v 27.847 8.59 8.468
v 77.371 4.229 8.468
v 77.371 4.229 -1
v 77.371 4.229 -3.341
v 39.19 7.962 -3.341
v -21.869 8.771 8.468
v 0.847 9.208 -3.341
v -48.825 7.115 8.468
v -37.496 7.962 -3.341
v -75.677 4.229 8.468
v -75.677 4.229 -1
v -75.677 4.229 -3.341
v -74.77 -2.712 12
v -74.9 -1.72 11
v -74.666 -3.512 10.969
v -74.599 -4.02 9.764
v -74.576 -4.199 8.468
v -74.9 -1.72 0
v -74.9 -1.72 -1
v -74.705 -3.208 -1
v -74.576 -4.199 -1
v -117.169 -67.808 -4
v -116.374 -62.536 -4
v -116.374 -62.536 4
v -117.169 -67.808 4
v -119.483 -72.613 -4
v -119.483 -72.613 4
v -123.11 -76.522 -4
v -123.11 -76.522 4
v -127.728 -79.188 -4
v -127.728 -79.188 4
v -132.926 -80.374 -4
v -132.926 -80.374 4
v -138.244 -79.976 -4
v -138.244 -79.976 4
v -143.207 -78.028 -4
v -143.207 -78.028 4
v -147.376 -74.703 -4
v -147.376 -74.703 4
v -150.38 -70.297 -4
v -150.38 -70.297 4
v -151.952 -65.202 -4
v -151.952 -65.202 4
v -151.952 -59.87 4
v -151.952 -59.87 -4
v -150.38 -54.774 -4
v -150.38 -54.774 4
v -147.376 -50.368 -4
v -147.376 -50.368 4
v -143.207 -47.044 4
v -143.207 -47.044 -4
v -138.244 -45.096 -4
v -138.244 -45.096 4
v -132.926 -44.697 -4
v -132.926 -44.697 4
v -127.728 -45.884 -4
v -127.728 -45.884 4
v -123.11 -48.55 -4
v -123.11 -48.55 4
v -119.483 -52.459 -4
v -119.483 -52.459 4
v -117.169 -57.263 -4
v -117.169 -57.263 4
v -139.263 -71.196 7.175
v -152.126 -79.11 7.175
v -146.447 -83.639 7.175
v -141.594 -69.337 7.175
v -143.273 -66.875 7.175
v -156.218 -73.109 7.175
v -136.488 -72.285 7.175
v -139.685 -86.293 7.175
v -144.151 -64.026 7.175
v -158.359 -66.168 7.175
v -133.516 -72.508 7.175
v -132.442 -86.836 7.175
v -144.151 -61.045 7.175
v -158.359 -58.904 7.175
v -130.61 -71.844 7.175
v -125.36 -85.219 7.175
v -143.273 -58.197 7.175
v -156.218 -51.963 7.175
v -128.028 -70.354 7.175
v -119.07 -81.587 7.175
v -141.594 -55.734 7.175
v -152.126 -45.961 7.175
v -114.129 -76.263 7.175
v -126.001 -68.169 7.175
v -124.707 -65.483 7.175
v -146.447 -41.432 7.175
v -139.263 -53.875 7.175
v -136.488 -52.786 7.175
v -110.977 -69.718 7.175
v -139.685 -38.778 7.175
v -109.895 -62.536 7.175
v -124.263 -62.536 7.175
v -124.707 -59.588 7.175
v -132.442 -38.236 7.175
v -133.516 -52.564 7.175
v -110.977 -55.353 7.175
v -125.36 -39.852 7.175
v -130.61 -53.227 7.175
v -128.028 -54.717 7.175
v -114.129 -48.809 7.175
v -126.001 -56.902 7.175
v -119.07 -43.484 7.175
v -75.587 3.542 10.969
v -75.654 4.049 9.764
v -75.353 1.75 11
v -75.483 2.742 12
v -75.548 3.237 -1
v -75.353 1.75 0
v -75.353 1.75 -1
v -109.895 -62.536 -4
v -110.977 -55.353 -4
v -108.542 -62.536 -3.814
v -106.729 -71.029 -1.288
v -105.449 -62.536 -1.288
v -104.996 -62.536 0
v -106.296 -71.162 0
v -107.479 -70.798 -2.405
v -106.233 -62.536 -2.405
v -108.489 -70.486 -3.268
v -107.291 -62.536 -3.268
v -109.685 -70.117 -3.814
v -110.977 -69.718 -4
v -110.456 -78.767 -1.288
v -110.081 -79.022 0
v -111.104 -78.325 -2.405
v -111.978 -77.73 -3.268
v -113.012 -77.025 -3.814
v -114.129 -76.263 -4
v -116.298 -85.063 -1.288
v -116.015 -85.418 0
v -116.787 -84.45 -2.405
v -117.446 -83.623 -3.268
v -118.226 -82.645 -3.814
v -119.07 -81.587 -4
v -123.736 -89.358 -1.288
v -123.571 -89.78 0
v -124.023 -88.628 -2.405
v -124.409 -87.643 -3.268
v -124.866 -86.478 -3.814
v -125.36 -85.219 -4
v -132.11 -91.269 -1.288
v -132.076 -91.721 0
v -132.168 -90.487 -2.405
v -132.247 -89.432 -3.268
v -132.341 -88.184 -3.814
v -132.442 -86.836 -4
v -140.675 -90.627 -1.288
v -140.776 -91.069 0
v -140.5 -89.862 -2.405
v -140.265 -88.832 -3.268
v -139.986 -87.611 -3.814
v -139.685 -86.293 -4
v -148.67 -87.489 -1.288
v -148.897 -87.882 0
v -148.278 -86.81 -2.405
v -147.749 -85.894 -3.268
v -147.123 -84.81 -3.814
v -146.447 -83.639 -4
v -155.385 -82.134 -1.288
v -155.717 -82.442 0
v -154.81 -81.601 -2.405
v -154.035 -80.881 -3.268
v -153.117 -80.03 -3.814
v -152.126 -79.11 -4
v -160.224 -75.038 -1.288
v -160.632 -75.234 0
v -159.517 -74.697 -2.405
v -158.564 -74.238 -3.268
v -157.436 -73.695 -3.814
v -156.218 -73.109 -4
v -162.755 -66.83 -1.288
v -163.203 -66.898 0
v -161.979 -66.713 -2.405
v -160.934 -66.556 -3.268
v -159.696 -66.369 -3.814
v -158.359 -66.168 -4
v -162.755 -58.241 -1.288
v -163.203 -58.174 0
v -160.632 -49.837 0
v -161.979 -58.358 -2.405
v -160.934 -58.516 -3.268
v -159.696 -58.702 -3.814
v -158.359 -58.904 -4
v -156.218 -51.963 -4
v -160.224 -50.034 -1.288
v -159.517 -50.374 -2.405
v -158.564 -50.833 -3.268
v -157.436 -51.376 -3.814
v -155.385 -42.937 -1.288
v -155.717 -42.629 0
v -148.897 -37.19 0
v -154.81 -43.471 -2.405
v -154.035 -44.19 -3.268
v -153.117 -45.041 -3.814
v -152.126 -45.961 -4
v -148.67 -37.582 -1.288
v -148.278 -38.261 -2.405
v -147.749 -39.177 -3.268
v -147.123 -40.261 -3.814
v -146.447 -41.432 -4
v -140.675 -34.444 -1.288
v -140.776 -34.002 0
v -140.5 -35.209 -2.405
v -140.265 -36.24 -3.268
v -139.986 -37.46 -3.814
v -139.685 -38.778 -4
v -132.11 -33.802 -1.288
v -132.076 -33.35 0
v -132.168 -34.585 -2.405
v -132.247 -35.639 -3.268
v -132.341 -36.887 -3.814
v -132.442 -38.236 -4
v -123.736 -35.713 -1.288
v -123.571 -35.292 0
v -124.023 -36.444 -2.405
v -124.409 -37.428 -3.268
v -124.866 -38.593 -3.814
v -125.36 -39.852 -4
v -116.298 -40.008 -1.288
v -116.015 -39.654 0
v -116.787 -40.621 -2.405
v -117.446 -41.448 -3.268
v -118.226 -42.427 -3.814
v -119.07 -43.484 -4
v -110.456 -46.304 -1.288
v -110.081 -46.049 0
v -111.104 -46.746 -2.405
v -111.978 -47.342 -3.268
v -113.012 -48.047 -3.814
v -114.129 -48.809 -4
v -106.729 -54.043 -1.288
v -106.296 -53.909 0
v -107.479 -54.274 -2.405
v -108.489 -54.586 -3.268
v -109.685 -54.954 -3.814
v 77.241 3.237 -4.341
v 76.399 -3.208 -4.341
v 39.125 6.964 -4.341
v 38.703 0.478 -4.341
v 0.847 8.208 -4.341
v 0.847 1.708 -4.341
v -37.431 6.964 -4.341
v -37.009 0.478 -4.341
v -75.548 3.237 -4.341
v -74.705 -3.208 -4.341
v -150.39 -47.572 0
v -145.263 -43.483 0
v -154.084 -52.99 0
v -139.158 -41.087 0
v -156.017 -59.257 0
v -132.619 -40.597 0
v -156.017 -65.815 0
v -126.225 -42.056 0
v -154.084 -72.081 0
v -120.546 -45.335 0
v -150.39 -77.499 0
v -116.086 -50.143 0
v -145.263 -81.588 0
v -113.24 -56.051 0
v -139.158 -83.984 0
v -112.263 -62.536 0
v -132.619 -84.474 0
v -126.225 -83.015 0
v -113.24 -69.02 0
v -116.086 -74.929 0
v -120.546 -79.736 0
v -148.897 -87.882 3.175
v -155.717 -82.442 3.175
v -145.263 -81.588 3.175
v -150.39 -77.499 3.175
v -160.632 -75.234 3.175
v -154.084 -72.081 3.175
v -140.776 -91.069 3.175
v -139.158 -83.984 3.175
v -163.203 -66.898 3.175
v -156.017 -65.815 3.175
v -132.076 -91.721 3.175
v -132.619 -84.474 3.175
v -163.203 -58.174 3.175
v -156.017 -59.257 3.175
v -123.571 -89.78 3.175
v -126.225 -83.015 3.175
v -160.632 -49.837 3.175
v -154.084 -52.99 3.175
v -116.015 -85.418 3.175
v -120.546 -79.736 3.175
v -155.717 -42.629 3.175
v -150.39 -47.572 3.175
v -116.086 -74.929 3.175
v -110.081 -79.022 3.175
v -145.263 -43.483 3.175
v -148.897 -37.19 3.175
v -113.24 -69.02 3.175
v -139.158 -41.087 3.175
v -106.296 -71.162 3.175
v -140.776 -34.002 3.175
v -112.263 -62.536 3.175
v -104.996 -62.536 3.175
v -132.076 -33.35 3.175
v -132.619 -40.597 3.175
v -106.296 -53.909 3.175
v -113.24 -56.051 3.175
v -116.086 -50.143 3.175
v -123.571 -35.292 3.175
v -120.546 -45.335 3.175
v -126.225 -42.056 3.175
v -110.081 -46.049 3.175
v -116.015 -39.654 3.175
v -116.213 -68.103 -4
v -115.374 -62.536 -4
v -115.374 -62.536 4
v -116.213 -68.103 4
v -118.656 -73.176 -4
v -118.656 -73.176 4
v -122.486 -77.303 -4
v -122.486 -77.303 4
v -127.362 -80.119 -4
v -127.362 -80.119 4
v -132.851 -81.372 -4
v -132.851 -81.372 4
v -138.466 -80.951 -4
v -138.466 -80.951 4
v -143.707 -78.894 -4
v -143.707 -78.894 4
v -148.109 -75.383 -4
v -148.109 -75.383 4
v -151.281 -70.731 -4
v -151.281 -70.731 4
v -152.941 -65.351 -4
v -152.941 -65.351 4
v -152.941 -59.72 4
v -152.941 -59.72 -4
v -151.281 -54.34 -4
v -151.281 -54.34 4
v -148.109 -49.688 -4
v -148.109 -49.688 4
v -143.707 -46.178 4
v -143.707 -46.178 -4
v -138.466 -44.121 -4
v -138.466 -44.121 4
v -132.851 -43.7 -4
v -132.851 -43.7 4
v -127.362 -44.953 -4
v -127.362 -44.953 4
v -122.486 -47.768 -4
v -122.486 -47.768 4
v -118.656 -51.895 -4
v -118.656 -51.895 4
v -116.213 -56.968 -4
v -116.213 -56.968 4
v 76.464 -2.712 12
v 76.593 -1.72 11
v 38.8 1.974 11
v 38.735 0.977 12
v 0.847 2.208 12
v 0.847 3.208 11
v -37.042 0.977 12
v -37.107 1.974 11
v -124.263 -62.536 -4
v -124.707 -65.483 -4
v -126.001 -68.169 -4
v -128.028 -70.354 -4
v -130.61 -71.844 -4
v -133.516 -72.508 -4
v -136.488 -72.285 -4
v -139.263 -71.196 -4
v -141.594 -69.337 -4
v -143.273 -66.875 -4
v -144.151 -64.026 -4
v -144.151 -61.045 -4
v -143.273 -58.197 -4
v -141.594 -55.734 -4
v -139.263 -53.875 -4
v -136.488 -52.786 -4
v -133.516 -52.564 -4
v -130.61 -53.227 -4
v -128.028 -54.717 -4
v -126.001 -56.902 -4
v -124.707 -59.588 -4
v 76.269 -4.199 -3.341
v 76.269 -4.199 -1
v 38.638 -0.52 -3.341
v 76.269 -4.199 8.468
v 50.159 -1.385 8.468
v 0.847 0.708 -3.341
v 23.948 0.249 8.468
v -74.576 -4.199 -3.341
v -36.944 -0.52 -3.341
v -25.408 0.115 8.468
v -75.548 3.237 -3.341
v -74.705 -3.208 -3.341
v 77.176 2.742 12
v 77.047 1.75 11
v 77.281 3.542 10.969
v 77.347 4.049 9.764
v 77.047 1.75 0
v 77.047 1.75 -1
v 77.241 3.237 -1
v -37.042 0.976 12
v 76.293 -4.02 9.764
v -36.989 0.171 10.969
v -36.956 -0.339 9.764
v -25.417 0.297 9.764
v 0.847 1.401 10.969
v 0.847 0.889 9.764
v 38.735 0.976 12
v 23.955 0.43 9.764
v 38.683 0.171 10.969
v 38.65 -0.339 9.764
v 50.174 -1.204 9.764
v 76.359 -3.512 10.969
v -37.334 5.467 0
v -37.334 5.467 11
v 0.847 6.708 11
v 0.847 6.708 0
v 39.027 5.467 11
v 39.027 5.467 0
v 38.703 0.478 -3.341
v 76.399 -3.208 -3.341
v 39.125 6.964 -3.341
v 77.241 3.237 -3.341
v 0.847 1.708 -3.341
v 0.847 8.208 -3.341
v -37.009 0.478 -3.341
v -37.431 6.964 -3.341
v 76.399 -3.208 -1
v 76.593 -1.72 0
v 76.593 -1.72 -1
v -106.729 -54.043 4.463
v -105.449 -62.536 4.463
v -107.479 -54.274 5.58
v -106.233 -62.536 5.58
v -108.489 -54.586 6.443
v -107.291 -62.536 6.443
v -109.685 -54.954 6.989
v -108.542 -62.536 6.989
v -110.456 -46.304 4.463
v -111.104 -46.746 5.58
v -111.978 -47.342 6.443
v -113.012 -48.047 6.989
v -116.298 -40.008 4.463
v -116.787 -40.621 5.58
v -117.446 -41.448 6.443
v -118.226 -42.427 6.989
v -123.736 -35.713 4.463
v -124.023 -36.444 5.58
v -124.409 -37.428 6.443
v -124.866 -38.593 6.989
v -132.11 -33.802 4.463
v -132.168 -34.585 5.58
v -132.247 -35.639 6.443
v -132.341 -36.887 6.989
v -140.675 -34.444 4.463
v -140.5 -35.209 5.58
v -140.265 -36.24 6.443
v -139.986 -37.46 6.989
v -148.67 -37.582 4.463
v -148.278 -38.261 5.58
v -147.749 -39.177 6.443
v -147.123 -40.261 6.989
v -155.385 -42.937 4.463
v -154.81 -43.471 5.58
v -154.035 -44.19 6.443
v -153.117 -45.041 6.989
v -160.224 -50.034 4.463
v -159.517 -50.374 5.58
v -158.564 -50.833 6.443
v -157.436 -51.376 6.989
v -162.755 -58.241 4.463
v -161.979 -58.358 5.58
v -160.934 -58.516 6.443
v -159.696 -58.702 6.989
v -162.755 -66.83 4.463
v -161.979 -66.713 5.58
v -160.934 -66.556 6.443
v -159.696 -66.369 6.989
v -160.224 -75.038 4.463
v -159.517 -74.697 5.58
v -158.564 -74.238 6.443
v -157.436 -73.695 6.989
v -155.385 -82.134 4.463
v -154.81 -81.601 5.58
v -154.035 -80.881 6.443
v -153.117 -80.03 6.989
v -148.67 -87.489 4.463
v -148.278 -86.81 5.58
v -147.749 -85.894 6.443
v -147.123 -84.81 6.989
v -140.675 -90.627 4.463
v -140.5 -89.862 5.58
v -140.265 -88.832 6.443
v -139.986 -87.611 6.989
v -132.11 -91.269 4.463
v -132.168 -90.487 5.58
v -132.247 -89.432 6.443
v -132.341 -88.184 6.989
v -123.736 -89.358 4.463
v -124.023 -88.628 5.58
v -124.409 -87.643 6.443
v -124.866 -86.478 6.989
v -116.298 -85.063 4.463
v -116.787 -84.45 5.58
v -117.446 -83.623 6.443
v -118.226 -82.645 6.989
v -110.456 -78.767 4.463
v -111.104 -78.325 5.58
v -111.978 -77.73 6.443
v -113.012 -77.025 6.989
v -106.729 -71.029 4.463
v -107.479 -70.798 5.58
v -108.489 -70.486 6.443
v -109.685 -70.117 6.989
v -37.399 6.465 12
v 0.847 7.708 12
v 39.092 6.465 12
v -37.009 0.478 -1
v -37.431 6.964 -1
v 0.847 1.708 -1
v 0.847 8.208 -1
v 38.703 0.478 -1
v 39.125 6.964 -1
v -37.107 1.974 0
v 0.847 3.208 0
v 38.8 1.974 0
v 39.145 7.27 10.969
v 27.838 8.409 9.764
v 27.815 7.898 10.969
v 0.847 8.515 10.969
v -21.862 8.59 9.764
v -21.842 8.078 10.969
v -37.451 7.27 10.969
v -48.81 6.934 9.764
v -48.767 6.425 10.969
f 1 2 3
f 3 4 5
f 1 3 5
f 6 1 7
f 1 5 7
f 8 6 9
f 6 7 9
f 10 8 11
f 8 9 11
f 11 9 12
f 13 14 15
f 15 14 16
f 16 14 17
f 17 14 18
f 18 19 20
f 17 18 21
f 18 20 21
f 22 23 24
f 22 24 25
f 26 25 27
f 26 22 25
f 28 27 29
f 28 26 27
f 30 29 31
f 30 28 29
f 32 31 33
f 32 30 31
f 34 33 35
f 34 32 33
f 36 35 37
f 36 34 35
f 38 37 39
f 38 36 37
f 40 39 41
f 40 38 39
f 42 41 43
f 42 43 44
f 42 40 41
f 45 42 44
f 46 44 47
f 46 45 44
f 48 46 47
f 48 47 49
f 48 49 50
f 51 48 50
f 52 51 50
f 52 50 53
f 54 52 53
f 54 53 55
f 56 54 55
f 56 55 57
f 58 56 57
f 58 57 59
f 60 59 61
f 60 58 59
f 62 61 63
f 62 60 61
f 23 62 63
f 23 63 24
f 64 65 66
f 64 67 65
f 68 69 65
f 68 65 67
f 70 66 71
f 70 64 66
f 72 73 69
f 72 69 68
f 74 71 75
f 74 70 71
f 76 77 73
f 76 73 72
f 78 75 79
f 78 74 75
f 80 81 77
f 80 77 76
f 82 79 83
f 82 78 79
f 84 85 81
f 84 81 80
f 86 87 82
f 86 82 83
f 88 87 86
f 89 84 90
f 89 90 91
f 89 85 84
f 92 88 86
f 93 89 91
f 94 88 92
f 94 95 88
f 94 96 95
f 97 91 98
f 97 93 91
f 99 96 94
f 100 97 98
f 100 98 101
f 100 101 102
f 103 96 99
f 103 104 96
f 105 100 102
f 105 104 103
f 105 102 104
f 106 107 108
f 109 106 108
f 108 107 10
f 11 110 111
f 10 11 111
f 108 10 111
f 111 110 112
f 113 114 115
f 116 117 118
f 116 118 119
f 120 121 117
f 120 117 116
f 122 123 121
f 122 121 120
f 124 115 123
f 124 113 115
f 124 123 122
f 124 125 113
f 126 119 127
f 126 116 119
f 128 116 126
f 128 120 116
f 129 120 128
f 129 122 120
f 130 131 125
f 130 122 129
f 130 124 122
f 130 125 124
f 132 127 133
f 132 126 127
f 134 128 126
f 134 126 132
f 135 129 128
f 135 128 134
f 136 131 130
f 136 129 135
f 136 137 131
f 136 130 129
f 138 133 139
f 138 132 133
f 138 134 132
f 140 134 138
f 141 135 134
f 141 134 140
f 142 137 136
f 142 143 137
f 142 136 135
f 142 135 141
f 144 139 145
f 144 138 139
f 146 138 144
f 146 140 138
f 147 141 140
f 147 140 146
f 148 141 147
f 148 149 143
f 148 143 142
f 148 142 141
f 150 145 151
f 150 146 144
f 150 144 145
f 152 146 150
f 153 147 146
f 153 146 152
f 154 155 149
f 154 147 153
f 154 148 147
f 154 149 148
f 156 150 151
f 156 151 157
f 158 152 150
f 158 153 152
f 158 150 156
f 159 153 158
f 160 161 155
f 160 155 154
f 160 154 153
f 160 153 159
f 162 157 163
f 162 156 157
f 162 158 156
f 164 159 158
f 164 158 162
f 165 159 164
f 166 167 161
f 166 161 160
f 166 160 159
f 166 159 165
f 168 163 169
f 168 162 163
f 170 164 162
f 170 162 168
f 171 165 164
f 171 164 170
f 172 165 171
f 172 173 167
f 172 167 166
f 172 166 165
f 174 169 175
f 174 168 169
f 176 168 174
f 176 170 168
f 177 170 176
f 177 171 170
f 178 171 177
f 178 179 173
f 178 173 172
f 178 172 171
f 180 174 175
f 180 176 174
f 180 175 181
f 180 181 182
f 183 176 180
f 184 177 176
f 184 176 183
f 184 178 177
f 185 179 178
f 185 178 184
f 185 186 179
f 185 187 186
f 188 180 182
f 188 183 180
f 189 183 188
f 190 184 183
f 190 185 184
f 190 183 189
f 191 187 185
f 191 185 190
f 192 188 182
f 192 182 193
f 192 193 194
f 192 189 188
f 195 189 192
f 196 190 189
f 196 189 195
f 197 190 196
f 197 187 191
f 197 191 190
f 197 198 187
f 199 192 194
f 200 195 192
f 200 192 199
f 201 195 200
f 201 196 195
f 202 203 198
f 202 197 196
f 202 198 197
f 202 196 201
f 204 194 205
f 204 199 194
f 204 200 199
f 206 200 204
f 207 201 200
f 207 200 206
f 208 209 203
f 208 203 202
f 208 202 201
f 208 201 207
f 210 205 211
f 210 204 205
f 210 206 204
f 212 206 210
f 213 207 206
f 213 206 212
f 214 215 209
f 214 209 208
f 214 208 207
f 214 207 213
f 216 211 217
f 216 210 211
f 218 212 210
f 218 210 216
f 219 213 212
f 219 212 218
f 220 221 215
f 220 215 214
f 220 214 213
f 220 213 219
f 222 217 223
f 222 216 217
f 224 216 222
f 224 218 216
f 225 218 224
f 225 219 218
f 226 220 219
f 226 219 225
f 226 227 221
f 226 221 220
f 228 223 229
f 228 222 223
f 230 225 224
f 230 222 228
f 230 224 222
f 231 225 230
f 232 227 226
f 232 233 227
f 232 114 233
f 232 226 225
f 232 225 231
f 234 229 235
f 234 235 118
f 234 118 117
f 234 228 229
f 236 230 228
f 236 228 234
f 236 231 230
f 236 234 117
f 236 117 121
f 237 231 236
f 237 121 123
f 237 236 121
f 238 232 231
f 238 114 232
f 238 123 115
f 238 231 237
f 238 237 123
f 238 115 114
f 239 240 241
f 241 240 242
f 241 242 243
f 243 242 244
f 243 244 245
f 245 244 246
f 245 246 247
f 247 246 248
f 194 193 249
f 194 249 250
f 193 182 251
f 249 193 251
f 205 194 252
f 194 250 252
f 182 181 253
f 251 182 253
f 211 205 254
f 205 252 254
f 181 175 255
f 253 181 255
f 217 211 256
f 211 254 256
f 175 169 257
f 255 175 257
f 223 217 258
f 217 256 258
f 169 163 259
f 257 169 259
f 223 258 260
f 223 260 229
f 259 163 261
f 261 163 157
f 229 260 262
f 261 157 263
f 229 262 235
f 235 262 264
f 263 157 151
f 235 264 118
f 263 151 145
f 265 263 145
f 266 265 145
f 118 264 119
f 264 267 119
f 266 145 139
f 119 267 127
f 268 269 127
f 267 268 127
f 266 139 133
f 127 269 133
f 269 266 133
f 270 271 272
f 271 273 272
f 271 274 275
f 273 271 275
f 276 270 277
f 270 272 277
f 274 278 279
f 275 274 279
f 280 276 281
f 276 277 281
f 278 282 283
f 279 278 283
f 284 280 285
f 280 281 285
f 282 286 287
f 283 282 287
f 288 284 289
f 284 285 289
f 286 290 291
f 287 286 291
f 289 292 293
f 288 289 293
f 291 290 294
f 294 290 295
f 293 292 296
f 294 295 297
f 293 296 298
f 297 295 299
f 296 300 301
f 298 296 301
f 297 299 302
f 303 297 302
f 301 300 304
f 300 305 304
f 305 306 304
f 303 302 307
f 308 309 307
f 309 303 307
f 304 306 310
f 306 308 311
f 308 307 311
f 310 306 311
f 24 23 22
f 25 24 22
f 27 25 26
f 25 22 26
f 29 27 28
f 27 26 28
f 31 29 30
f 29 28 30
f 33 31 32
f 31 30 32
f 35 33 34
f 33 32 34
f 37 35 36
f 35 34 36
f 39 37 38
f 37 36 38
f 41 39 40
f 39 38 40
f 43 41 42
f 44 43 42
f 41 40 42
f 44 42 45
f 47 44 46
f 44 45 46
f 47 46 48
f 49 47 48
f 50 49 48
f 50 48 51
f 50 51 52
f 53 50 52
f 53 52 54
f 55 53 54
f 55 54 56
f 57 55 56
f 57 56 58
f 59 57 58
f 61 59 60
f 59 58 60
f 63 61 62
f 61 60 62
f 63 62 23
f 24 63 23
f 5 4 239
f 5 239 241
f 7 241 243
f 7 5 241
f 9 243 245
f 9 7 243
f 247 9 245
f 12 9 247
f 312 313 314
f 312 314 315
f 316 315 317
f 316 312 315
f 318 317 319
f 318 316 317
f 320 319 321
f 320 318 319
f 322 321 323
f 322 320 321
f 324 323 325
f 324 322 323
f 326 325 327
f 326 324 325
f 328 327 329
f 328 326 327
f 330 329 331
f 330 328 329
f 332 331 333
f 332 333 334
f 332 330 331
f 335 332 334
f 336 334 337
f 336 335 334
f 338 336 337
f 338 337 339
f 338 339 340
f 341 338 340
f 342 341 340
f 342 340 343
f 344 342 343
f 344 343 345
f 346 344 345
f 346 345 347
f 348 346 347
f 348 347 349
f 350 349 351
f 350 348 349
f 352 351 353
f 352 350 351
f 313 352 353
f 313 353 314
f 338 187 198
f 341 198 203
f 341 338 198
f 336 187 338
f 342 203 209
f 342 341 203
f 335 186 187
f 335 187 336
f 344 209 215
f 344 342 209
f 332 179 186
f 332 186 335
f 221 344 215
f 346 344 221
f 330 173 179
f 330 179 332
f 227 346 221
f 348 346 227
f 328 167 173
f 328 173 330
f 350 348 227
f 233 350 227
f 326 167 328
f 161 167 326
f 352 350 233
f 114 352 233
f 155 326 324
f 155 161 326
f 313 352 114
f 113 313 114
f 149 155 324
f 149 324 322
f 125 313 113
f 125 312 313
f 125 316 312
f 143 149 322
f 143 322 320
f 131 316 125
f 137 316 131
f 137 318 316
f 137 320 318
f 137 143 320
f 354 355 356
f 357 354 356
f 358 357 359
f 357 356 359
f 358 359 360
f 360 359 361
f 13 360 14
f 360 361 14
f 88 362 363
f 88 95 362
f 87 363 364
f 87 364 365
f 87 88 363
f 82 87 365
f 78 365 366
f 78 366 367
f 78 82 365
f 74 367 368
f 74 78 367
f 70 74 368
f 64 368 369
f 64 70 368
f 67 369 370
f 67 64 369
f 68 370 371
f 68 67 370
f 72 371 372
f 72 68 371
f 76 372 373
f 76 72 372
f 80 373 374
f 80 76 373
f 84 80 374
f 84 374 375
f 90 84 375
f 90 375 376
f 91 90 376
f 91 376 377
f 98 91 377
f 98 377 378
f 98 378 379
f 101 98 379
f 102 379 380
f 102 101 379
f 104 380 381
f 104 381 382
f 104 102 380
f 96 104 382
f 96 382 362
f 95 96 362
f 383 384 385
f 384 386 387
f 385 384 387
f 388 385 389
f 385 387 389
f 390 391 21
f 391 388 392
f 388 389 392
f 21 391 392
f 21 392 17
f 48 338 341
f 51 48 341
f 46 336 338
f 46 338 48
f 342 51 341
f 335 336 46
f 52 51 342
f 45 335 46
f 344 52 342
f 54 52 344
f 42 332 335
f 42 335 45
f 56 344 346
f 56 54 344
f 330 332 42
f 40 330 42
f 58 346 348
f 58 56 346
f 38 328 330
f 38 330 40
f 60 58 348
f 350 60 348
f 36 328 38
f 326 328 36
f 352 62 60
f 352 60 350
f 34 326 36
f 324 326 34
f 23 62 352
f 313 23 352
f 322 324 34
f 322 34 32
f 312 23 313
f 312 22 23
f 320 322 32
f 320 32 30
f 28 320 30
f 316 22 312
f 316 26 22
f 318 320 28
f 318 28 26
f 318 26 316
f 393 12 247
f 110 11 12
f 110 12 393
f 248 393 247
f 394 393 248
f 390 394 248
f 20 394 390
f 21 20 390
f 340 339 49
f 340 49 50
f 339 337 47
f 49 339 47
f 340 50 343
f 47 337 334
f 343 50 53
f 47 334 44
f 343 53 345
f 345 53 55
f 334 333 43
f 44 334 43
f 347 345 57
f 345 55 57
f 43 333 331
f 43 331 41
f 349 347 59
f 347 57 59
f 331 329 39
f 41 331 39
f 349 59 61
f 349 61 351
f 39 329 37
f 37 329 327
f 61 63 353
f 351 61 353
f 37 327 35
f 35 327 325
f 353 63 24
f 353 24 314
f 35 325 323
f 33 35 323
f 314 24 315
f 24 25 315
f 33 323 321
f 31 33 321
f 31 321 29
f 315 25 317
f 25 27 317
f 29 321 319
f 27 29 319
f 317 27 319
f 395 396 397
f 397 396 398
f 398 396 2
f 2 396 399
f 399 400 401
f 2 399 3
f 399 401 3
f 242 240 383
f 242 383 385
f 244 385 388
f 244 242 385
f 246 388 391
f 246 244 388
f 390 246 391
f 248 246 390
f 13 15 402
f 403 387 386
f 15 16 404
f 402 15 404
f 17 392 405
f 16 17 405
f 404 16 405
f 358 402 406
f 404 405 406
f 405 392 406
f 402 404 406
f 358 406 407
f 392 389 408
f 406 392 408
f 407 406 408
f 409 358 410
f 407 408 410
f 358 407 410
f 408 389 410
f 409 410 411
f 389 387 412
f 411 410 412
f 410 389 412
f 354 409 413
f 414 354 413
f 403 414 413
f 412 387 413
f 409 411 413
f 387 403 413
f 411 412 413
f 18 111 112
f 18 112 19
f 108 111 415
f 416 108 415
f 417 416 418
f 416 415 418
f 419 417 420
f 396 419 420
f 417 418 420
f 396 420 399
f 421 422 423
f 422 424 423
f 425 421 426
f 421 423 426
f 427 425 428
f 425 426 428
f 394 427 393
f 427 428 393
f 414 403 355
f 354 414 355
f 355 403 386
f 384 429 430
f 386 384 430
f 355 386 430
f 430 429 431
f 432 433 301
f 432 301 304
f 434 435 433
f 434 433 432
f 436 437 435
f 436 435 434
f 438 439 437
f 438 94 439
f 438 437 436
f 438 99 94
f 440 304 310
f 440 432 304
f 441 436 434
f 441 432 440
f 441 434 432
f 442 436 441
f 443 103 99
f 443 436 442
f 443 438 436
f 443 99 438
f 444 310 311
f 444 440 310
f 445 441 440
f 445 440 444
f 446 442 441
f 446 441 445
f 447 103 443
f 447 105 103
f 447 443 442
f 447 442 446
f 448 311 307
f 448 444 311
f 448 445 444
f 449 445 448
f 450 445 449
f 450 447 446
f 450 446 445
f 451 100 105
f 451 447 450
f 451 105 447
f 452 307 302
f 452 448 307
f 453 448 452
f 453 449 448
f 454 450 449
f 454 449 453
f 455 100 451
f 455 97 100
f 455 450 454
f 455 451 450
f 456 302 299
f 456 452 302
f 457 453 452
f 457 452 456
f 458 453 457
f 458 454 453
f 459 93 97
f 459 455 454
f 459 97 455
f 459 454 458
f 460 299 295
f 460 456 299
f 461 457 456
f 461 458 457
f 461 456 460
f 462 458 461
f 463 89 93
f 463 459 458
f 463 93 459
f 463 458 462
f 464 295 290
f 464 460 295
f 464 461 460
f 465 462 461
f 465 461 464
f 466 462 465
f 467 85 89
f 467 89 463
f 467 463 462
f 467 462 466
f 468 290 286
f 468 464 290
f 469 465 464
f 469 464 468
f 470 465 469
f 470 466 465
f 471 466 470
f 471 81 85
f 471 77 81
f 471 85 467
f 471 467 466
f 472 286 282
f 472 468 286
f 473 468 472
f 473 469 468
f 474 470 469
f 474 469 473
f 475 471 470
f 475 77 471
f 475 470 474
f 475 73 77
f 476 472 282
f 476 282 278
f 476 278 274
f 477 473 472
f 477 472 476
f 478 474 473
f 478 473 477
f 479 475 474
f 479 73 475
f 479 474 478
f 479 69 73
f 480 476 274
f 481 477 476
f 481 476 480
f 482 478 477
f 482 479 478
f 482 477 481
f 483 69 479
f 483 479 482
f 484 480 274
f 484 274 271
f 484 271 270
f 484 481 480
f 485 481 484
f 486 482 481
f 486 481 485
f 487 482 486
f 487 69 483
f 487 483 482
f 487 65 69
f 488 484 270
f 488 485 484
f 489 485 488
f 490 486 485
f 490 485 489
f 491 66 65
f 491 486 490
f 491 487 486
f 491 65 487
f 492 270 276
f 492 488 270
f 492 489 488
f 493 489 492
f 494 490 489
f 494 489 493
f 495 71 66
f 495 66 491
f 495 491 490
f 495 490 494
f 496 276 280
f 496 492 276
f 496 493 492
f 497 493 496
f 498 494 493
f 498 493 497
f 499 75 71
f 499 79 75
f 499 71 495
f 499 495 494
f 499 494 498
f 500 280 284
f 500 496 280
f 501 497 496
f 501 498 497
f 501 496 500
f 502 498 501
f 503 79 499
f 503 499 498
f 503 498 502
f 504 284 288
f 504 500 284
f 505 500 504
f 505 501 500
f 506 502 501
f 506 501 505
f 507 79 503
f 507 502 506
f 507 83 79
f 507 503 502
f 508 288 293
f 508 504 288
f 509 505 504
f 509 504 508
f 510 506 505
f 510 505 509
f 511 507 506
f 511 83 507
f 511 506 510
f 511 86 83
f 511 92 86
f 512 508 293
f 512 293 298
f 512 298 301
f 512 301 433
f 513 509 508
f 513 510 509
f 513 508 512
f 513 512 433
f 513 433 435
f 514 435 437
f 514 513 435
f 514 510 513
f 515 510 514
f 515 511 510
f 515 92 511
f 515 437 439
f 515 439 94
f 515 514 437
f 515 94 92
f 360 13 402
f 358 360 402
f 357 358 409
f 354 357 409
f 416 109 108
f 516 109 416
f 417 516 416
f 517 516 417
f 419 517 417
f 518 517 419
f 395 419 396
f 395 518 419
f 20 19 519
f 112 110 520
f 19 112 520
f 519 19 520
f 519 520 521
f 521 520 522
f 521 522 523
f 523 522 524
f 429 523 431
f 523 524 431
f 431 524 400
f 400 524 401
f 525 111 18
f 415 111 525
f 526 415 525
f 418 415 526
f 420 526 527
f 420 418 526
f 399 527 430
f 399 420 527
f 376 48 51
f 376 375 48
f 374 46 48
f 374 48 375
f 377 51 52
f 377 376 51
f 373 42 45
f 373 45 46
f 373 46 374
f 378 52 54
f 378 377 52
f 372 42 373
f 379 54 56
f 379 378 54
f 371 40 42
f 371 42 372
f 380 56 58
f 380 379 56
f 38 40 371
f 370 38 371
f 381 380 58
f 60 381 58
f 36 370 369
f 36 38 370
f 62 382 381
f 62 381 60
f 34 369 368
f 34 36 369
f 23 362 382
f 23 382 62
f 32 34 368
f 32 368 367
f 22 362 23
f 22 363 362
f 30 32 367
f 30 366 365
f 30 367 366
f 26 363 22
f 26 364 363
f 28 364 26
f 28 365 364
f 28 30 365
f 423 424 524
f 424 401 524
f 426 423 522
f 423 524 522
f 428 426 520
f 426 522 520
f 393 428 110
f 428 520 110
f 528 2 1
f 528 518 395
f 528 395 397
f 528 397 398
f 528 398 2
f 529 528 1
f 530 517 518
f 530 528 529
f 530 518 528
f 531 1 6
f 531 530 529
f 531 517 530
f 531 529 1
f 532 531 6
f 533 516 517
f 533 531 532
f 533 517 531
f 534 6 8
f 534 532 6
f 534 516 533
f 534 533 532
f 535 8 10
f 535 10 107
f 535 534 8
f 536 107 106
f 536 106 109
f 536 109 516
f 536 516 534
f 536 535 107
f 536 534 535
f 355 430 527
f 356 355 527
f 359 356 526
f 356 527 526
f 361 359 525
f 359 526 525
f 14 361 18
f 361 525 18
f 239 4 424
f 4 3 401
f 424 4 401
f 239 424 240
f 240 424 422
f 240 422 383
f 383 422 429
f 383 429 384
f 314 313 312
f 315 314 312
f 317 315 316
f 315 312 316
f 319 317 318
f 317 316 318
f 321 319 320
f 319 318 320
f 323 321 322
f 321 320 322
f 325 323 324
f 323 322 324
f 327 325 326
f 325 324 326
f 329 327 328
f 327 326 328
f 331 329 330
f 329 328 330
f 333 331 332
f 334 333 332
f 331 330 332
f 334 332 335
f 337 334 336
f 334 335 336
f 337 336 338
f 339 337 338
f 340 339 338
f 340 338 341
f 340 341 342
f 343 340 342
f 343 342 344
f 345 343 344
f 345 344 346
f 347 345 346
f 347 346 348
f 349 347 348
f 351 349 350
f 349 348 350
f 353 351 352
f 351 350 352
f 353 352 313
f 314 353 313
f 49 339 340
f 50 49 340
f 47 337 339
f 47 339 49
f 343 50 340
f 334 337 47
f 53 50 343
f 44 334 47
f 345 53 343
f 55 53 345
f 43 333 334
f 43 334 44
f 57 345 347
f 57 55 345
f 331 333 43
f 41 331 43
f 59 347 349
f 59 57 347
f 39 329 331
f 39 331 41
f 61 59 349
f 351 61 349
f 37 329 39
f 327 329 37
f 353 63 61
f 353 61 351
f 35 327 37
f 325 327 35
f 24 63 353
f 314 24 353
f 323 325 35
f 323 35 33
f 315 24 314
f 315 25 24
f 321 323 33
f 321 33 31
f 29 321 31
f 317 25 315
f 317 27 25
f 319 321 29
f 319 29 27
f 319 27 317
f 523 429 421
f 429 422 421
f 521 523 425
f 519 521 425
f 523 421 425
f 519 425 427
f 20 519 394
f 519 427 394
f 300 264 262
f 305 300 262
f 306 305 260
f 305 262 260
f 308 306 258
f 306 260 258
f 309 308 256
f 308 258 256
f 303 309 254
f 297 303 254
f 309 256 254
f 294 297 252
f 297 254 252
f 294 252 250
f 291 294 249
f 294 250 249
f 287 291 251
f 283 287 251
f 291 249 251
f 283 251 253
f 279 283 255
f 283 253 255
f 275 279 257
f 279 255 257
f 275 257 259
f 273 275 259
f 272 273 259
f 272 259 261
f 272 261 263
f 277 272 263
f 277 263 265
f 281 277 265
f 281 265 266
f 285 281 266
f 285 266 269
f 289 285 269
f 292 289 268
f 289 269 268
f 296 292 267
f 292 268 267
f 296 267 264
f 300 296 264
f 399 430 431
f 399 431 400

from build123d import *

# Parameters (mm, degrees)
F1_DEPTH    = 1
F4_DEPTH    = 1
F6_DEPTH    = 12
F7_SIZE     = 1
F8_T2_ANGLE = 16.6478295889
F8_T4_ANGLE = 16.6225349948
F11_SIZE    = 1
F12_R       = 22
F12_R_2     = 10
F13_DEPTH   = 3.175
F14_R       = 29.2671438264
F15_DEPTH   = 4
F17_DEPTH   = 25
F18_R       = 29.2671438264
F18_R_2     = 10
F19_DEPTH   = 4
F21_R       = 18.8886705246
F21_R_2     = 17.8886705246
F22_DEPTH   = 8


# Not quite as in the source:
# - a fillet or chamfer that OpenCascade refuses, or shapes differently, is made with other operations: its cross-section is extruded or revolved along the edge and cut away or added


with BuildPart() as f1:
    # F0 (on Top) → F1 (new body)
    with BuildSketch(Plane.XY):
        Polygon((76.2, -1.75), (76.2, 1.75), (76.2, 6.1025535688), (-76.2, 6.1025535688), (-76.2, 1.75), (-76.2, -1.75), (-76.2, -6.1025535688), (76.2, -6.1025535688), align=None)
    extrude(amount=-F1_DEPTH)


with BuildPart() as f4:
    # F3 (on Top) → F4 (new body)
    with BuildSketch(Plane.XY):
        with BuildLine():
            Line((76.2692624922, -4.1994154081), (76.5932074415, -1.7204923214))
            ThreePointArc((76.5932074415, -1.7204923214), (0.8467303705, 3.2078201362), (-74.8997467005, -1.7204923214))
            Line((-74.8997467005, -1.7204923214), (-74.5758017512, -4.1994154081))
            ThreePointArc((-74.5758017512, -4.1994154081), (0.8467303705, 0.7078201362), (76.2692624922, -4.1994154081))
        make_face()
        with BuildLine():
            Line((76.5932074415, -1.7204923214), (77.0467303705, 1.75))
            ThreePointArc((77.0467303705, 1.75), (0.8467303705, 6.7078201362), (-75.3532696295, 1.75))
            Line((-75.3532696295, 1.75), (-74.8997467005, -1.7204923214))
            ThreePointArc((-74.8997467005, -1.7204923214), (0.8467303705, 3.2078201362), (76.5932074415, -1.7204923214))
        make_face()
        with BuildLine():
            ThreePointArc((-75.3532696295, 1.75), (0.8467303705, 6.7078201362), (77.0467303705, 1.75))
            Line((77.0467303705, 1.75), (77.3706753198, 4.2289230867))
            ThreePointArc((77.3706753198, 4.2289230867), (0.8467303705, 9.2078201362), (-75.6772145787, 4.2289230867))
            Line((-75.6772145787, 4.2289230867), (-75.3532696295, 1.75))
        make_face()
    extrude(amount=-F4_DEPTH)

    # F5 (on face) → F6 (join)
    with BuildSketch(Plane.XY):
        with BuildLine():
            ThreePointArc((-75.3532696295, 1.75), (0.8467303705, 6.7078201362), (77.0467303705, 1.75))
            Line((77.0467303705, 1.75), (77.3706753198, 4.2289230867))
            ThreePointArc((77.3706753198, 4.2289230867), (0.8467303705, 9.2078201362), (-75.6772145787, 4.2289230867))
            Line((-75.6772145787, 4.2289230867), (-75.3532696295, 1.75))
        make_face()
        with BuildLine():
            Line((76.2692624922, -4.1994154081), (76.5932074415, -1.7204923214))
            ThreePointArc((76.5932074415, -1.7204923214), (0.8467303705, 3.2078201362), (-74.8997467005, -1.7204923214))
            Line((-74.8997467005, -1.7204923214), (-74.5758017512, -4.1994154081))
            ThreePointArc((-74.5758017512, -4.1994154081), (0.8467303705, 0.7078201362), (76.2692624922, -4.1994154081))
        make_face()
    extrude(amount=F6_DEPTH)

    # F7
    f7_edges = [f4.edges().sort_by_distance(p)[0] for p in [
        (0.84673, 6.70782, 12),
        (0.84673, 3.20782, 12),
    ]]
    chamfer(f7_edges, length=F7_SIZE)

    # F8: fillet of radius 5 on 2 edges, made by hand

    # F8_s1 → F8_t2 (revolve, cut)
    with BuildSketch(Plane(origin=(-82.446715332, -12.0628221249, 0), x_dir=(0, 0, 1), z_dir=(-0.9894654498, -0.1447692085, 0))):
        with BuildLine():
            ThreePointArc((12.0001071227, 8.2094487393), (10.36586952, 7.099643712), (8.4293487989, 6.709403738))
            Line((8.4293487989, 6.709403738), (8.4293487989, 6.609403738))
            ThreePointArc((8.4293487989, 6.609403738), (10.2146743994, 6.609553738), (12, 6.609553738))
            Line((12, 6.609553738), (12.1, 6.709553738))
            ThreePointArc((12.1, 6.709553738), (12.1, 7.4595012386), (12.0715222892, 8.1394496393))
            Line((12.0715222892, 8.1394496393), (12.0001071227, 8.2094487393))
        make_face()
    revolve(axis=Axis((0.8467303705, -581.3550603549, 12), (0, 0, -1)), revolution_arc=F8_T2_ANGLE, mode=Mode.SUBTRACT)

    # F8_s3 → F8_t4 (revolve, cut)
    with BuildSketch(Plane(origin=(83.9817821189, -12.2684844413, 0), x_dir=(0, 0, 1), z_dir=(0.9894973816, -0.1445507933, 0))):
        with BuildLine():
            ThreePointArc((8.4293487989, -15.4361160503), (10.36586952, -15.0458760762), (12.0001071227, -13.9360710489))
            Line((12.0001071227, -13.9360710489), (12.0715222892, -14.0060701489))
            ThreePointArc((12.0715222892, -14.0060701489), (12.1, -14.6860185496), (12.1, -15.4359660503))
            Line((12.1, -15.4359660503), (12, -15.5359660503))
            ThreePointArc((12, -15.5359660503), (10.2146743994, -15.5359660503), (8.4293487989, -15.5361160503))
            Line((8.4293487989, -15.5361160503), (8.4293487989, -15.4361160503))
        make_face()
    revolve(axis=Axis((0.8467303705, -581.3550603549, 12), (0, 0, 1)), revolution_arc=F8_T4_ANGLE, mode=Mode.SUBTRACT)

    # F10: sweep along a path in F10_path
    with BuildLine(Plane(origin=(76.2692624922, -4.1994154081, -1), x_dir=(0, -1, 0), z_dir=(0, 0, -1))) as f10_path:
        ThreePointArc((0, 0), (-4.9072355443, 75.4225321217), (0, 150.8450642434))
    # F9 (on face) → F10 (sweep)
    with BuildSketch(Plane(origin=(-73.8632044186, -9.6524221094, 0), x_dir=(0.1295779797, -0.9915692347, 0), z_dir=(-0.9915692347, -0.1295779797, 0))):
        Polygon((-5.4993706043, -4.3409038335), (-5.4993706043, -1), (-6.4993706043, -1), (-6.4993706043, -3.3409038335), (-12.9993706043, -3.3409038335), (-12.9993706043, -1), (-13.9993706043, -1), (-13.9993706043, -4.3409038335), align=None)
    sweep(path=f10_path.line)

    # F11
    f11_edges = [f4.edges().sort_by_distance(p)[0] for p in [
        (0.84673, 0.70782, -4.340904),
        (0.84673, 9.20782, -4.340904),
    ]]
    chamfer(f11_edges, length=F11_SIZE)


with BuildPart() as f13:
    # F12 (on Top) → F13 (new body)
    with BuildSketch(Plane.XY):
        with Locations((-134.2629939318, -62.5356882811)):
            Circle(F12_R)
        with Locations((-134.2629939318, -62.5356882811)):
            Circle(F12_R_2, mode=Mode.SUBTRACT)
    extrude(amount=F13_DEPTH)

    # F14 (on face) → F15 (join)
    with BuildSketch(Plane.XY.offset(3.175)):
        with Locations((-134.2629939318, -62.5356882811)):
            Circle(F14_R)
    extrude(amount=F15_DEPTH)

    # F16: fillet of radius 5 on 1 edges, made by hand

    # F16_s1 → F16_t2 (revolve, cut)
    with BuildSketch(Plane.XZ.offset(62.5356882811)):
        with BuildLine():
            ThreePointArc((-104.9958501054, 3.175), (-106.7325519308, 6.0479833462), (-109.894829591, 7.175))
            Line((-109.894829591, 7.175), (-104.9958501054, 7.175))
            Line((-104.9958501054, 7.175), (-104.9958501054, 3.175))
        make_face()
    revolve(axis=Axis((-134.2629939318, -62.5356882811, 7.175), (0, 0, 1)), mode=Mode.SUBTRACT)

    # F17 (cut): a face of the model
    f17_faces = [f13.faces().sort_by_distance(p)[0] for p in [
        (-134.2629939318, -62.5356882811, 3.175),
    ]]
    extrude(f17_faces, amount=-F17_DEPTH, mode=Mode.SUBTRACT)

    # F18 (on face) → F19 (join)
    with BuildSketch(Plane(origin=(0, 0, 0), x_dir=(1, 0, 0), z_dir=(0, 0, -1))):
        with Locations((-134.2629939318, 62.5356882811)):
            Circle(F18_R)
        with Locations((-134.2629939318, 62.5356882811)):
            Circle(F18_R_2, mode=Mode.SUBTRACT)
    extrude(amount=F19_DEPTH)

    # F20: fillet of radius 5 on 1 edges, made by hand

    # F20_s1 → F20_t2 (revolve, cut)
    with BuildSketch(Plane.XZ.offset(62.5356882811)):
        with BuildLine():
            ThreePointArc((-104.9958501054, 0), (-106.7325519308, -2.8729833462), (-109.894829591, -4))
            Line((-109.894829591, -4), (-104.9958501054, -4))
            Line((-104.9958501054, -4), (-104.9958501054, 0))
        make_face()
    revolve(axis=Axis((-134.2629939318, -62.5356882811, -4), (0, 0, -1)), mode=Mode.SUBTRACT)


with BuildPart() as f22:
    # F21 (on face) → F22 (new body)
    with BuildSketch(Plane(origin=(0, 0, -4), x_dir=(1, 0, 0), z_dir=(0, 0, -1))):
        with Locations((-134.2629939318, 62.5356882811)):
            Circle(F21_R)
        with Locations((-134.2629939318, 62.5356882811)):
            Circle(F21_R_2, mode=Mode.SUBTRACT)
    extrude(amount=-F22_DEPTH)


with BuildPart() as f13_1:
    add(f13.part)

    # F23: cut F22
    add(f22.part, mode=Mode.SUBTRACT)


solid = Compound([f4.part, f22.part, f13_1.part])
